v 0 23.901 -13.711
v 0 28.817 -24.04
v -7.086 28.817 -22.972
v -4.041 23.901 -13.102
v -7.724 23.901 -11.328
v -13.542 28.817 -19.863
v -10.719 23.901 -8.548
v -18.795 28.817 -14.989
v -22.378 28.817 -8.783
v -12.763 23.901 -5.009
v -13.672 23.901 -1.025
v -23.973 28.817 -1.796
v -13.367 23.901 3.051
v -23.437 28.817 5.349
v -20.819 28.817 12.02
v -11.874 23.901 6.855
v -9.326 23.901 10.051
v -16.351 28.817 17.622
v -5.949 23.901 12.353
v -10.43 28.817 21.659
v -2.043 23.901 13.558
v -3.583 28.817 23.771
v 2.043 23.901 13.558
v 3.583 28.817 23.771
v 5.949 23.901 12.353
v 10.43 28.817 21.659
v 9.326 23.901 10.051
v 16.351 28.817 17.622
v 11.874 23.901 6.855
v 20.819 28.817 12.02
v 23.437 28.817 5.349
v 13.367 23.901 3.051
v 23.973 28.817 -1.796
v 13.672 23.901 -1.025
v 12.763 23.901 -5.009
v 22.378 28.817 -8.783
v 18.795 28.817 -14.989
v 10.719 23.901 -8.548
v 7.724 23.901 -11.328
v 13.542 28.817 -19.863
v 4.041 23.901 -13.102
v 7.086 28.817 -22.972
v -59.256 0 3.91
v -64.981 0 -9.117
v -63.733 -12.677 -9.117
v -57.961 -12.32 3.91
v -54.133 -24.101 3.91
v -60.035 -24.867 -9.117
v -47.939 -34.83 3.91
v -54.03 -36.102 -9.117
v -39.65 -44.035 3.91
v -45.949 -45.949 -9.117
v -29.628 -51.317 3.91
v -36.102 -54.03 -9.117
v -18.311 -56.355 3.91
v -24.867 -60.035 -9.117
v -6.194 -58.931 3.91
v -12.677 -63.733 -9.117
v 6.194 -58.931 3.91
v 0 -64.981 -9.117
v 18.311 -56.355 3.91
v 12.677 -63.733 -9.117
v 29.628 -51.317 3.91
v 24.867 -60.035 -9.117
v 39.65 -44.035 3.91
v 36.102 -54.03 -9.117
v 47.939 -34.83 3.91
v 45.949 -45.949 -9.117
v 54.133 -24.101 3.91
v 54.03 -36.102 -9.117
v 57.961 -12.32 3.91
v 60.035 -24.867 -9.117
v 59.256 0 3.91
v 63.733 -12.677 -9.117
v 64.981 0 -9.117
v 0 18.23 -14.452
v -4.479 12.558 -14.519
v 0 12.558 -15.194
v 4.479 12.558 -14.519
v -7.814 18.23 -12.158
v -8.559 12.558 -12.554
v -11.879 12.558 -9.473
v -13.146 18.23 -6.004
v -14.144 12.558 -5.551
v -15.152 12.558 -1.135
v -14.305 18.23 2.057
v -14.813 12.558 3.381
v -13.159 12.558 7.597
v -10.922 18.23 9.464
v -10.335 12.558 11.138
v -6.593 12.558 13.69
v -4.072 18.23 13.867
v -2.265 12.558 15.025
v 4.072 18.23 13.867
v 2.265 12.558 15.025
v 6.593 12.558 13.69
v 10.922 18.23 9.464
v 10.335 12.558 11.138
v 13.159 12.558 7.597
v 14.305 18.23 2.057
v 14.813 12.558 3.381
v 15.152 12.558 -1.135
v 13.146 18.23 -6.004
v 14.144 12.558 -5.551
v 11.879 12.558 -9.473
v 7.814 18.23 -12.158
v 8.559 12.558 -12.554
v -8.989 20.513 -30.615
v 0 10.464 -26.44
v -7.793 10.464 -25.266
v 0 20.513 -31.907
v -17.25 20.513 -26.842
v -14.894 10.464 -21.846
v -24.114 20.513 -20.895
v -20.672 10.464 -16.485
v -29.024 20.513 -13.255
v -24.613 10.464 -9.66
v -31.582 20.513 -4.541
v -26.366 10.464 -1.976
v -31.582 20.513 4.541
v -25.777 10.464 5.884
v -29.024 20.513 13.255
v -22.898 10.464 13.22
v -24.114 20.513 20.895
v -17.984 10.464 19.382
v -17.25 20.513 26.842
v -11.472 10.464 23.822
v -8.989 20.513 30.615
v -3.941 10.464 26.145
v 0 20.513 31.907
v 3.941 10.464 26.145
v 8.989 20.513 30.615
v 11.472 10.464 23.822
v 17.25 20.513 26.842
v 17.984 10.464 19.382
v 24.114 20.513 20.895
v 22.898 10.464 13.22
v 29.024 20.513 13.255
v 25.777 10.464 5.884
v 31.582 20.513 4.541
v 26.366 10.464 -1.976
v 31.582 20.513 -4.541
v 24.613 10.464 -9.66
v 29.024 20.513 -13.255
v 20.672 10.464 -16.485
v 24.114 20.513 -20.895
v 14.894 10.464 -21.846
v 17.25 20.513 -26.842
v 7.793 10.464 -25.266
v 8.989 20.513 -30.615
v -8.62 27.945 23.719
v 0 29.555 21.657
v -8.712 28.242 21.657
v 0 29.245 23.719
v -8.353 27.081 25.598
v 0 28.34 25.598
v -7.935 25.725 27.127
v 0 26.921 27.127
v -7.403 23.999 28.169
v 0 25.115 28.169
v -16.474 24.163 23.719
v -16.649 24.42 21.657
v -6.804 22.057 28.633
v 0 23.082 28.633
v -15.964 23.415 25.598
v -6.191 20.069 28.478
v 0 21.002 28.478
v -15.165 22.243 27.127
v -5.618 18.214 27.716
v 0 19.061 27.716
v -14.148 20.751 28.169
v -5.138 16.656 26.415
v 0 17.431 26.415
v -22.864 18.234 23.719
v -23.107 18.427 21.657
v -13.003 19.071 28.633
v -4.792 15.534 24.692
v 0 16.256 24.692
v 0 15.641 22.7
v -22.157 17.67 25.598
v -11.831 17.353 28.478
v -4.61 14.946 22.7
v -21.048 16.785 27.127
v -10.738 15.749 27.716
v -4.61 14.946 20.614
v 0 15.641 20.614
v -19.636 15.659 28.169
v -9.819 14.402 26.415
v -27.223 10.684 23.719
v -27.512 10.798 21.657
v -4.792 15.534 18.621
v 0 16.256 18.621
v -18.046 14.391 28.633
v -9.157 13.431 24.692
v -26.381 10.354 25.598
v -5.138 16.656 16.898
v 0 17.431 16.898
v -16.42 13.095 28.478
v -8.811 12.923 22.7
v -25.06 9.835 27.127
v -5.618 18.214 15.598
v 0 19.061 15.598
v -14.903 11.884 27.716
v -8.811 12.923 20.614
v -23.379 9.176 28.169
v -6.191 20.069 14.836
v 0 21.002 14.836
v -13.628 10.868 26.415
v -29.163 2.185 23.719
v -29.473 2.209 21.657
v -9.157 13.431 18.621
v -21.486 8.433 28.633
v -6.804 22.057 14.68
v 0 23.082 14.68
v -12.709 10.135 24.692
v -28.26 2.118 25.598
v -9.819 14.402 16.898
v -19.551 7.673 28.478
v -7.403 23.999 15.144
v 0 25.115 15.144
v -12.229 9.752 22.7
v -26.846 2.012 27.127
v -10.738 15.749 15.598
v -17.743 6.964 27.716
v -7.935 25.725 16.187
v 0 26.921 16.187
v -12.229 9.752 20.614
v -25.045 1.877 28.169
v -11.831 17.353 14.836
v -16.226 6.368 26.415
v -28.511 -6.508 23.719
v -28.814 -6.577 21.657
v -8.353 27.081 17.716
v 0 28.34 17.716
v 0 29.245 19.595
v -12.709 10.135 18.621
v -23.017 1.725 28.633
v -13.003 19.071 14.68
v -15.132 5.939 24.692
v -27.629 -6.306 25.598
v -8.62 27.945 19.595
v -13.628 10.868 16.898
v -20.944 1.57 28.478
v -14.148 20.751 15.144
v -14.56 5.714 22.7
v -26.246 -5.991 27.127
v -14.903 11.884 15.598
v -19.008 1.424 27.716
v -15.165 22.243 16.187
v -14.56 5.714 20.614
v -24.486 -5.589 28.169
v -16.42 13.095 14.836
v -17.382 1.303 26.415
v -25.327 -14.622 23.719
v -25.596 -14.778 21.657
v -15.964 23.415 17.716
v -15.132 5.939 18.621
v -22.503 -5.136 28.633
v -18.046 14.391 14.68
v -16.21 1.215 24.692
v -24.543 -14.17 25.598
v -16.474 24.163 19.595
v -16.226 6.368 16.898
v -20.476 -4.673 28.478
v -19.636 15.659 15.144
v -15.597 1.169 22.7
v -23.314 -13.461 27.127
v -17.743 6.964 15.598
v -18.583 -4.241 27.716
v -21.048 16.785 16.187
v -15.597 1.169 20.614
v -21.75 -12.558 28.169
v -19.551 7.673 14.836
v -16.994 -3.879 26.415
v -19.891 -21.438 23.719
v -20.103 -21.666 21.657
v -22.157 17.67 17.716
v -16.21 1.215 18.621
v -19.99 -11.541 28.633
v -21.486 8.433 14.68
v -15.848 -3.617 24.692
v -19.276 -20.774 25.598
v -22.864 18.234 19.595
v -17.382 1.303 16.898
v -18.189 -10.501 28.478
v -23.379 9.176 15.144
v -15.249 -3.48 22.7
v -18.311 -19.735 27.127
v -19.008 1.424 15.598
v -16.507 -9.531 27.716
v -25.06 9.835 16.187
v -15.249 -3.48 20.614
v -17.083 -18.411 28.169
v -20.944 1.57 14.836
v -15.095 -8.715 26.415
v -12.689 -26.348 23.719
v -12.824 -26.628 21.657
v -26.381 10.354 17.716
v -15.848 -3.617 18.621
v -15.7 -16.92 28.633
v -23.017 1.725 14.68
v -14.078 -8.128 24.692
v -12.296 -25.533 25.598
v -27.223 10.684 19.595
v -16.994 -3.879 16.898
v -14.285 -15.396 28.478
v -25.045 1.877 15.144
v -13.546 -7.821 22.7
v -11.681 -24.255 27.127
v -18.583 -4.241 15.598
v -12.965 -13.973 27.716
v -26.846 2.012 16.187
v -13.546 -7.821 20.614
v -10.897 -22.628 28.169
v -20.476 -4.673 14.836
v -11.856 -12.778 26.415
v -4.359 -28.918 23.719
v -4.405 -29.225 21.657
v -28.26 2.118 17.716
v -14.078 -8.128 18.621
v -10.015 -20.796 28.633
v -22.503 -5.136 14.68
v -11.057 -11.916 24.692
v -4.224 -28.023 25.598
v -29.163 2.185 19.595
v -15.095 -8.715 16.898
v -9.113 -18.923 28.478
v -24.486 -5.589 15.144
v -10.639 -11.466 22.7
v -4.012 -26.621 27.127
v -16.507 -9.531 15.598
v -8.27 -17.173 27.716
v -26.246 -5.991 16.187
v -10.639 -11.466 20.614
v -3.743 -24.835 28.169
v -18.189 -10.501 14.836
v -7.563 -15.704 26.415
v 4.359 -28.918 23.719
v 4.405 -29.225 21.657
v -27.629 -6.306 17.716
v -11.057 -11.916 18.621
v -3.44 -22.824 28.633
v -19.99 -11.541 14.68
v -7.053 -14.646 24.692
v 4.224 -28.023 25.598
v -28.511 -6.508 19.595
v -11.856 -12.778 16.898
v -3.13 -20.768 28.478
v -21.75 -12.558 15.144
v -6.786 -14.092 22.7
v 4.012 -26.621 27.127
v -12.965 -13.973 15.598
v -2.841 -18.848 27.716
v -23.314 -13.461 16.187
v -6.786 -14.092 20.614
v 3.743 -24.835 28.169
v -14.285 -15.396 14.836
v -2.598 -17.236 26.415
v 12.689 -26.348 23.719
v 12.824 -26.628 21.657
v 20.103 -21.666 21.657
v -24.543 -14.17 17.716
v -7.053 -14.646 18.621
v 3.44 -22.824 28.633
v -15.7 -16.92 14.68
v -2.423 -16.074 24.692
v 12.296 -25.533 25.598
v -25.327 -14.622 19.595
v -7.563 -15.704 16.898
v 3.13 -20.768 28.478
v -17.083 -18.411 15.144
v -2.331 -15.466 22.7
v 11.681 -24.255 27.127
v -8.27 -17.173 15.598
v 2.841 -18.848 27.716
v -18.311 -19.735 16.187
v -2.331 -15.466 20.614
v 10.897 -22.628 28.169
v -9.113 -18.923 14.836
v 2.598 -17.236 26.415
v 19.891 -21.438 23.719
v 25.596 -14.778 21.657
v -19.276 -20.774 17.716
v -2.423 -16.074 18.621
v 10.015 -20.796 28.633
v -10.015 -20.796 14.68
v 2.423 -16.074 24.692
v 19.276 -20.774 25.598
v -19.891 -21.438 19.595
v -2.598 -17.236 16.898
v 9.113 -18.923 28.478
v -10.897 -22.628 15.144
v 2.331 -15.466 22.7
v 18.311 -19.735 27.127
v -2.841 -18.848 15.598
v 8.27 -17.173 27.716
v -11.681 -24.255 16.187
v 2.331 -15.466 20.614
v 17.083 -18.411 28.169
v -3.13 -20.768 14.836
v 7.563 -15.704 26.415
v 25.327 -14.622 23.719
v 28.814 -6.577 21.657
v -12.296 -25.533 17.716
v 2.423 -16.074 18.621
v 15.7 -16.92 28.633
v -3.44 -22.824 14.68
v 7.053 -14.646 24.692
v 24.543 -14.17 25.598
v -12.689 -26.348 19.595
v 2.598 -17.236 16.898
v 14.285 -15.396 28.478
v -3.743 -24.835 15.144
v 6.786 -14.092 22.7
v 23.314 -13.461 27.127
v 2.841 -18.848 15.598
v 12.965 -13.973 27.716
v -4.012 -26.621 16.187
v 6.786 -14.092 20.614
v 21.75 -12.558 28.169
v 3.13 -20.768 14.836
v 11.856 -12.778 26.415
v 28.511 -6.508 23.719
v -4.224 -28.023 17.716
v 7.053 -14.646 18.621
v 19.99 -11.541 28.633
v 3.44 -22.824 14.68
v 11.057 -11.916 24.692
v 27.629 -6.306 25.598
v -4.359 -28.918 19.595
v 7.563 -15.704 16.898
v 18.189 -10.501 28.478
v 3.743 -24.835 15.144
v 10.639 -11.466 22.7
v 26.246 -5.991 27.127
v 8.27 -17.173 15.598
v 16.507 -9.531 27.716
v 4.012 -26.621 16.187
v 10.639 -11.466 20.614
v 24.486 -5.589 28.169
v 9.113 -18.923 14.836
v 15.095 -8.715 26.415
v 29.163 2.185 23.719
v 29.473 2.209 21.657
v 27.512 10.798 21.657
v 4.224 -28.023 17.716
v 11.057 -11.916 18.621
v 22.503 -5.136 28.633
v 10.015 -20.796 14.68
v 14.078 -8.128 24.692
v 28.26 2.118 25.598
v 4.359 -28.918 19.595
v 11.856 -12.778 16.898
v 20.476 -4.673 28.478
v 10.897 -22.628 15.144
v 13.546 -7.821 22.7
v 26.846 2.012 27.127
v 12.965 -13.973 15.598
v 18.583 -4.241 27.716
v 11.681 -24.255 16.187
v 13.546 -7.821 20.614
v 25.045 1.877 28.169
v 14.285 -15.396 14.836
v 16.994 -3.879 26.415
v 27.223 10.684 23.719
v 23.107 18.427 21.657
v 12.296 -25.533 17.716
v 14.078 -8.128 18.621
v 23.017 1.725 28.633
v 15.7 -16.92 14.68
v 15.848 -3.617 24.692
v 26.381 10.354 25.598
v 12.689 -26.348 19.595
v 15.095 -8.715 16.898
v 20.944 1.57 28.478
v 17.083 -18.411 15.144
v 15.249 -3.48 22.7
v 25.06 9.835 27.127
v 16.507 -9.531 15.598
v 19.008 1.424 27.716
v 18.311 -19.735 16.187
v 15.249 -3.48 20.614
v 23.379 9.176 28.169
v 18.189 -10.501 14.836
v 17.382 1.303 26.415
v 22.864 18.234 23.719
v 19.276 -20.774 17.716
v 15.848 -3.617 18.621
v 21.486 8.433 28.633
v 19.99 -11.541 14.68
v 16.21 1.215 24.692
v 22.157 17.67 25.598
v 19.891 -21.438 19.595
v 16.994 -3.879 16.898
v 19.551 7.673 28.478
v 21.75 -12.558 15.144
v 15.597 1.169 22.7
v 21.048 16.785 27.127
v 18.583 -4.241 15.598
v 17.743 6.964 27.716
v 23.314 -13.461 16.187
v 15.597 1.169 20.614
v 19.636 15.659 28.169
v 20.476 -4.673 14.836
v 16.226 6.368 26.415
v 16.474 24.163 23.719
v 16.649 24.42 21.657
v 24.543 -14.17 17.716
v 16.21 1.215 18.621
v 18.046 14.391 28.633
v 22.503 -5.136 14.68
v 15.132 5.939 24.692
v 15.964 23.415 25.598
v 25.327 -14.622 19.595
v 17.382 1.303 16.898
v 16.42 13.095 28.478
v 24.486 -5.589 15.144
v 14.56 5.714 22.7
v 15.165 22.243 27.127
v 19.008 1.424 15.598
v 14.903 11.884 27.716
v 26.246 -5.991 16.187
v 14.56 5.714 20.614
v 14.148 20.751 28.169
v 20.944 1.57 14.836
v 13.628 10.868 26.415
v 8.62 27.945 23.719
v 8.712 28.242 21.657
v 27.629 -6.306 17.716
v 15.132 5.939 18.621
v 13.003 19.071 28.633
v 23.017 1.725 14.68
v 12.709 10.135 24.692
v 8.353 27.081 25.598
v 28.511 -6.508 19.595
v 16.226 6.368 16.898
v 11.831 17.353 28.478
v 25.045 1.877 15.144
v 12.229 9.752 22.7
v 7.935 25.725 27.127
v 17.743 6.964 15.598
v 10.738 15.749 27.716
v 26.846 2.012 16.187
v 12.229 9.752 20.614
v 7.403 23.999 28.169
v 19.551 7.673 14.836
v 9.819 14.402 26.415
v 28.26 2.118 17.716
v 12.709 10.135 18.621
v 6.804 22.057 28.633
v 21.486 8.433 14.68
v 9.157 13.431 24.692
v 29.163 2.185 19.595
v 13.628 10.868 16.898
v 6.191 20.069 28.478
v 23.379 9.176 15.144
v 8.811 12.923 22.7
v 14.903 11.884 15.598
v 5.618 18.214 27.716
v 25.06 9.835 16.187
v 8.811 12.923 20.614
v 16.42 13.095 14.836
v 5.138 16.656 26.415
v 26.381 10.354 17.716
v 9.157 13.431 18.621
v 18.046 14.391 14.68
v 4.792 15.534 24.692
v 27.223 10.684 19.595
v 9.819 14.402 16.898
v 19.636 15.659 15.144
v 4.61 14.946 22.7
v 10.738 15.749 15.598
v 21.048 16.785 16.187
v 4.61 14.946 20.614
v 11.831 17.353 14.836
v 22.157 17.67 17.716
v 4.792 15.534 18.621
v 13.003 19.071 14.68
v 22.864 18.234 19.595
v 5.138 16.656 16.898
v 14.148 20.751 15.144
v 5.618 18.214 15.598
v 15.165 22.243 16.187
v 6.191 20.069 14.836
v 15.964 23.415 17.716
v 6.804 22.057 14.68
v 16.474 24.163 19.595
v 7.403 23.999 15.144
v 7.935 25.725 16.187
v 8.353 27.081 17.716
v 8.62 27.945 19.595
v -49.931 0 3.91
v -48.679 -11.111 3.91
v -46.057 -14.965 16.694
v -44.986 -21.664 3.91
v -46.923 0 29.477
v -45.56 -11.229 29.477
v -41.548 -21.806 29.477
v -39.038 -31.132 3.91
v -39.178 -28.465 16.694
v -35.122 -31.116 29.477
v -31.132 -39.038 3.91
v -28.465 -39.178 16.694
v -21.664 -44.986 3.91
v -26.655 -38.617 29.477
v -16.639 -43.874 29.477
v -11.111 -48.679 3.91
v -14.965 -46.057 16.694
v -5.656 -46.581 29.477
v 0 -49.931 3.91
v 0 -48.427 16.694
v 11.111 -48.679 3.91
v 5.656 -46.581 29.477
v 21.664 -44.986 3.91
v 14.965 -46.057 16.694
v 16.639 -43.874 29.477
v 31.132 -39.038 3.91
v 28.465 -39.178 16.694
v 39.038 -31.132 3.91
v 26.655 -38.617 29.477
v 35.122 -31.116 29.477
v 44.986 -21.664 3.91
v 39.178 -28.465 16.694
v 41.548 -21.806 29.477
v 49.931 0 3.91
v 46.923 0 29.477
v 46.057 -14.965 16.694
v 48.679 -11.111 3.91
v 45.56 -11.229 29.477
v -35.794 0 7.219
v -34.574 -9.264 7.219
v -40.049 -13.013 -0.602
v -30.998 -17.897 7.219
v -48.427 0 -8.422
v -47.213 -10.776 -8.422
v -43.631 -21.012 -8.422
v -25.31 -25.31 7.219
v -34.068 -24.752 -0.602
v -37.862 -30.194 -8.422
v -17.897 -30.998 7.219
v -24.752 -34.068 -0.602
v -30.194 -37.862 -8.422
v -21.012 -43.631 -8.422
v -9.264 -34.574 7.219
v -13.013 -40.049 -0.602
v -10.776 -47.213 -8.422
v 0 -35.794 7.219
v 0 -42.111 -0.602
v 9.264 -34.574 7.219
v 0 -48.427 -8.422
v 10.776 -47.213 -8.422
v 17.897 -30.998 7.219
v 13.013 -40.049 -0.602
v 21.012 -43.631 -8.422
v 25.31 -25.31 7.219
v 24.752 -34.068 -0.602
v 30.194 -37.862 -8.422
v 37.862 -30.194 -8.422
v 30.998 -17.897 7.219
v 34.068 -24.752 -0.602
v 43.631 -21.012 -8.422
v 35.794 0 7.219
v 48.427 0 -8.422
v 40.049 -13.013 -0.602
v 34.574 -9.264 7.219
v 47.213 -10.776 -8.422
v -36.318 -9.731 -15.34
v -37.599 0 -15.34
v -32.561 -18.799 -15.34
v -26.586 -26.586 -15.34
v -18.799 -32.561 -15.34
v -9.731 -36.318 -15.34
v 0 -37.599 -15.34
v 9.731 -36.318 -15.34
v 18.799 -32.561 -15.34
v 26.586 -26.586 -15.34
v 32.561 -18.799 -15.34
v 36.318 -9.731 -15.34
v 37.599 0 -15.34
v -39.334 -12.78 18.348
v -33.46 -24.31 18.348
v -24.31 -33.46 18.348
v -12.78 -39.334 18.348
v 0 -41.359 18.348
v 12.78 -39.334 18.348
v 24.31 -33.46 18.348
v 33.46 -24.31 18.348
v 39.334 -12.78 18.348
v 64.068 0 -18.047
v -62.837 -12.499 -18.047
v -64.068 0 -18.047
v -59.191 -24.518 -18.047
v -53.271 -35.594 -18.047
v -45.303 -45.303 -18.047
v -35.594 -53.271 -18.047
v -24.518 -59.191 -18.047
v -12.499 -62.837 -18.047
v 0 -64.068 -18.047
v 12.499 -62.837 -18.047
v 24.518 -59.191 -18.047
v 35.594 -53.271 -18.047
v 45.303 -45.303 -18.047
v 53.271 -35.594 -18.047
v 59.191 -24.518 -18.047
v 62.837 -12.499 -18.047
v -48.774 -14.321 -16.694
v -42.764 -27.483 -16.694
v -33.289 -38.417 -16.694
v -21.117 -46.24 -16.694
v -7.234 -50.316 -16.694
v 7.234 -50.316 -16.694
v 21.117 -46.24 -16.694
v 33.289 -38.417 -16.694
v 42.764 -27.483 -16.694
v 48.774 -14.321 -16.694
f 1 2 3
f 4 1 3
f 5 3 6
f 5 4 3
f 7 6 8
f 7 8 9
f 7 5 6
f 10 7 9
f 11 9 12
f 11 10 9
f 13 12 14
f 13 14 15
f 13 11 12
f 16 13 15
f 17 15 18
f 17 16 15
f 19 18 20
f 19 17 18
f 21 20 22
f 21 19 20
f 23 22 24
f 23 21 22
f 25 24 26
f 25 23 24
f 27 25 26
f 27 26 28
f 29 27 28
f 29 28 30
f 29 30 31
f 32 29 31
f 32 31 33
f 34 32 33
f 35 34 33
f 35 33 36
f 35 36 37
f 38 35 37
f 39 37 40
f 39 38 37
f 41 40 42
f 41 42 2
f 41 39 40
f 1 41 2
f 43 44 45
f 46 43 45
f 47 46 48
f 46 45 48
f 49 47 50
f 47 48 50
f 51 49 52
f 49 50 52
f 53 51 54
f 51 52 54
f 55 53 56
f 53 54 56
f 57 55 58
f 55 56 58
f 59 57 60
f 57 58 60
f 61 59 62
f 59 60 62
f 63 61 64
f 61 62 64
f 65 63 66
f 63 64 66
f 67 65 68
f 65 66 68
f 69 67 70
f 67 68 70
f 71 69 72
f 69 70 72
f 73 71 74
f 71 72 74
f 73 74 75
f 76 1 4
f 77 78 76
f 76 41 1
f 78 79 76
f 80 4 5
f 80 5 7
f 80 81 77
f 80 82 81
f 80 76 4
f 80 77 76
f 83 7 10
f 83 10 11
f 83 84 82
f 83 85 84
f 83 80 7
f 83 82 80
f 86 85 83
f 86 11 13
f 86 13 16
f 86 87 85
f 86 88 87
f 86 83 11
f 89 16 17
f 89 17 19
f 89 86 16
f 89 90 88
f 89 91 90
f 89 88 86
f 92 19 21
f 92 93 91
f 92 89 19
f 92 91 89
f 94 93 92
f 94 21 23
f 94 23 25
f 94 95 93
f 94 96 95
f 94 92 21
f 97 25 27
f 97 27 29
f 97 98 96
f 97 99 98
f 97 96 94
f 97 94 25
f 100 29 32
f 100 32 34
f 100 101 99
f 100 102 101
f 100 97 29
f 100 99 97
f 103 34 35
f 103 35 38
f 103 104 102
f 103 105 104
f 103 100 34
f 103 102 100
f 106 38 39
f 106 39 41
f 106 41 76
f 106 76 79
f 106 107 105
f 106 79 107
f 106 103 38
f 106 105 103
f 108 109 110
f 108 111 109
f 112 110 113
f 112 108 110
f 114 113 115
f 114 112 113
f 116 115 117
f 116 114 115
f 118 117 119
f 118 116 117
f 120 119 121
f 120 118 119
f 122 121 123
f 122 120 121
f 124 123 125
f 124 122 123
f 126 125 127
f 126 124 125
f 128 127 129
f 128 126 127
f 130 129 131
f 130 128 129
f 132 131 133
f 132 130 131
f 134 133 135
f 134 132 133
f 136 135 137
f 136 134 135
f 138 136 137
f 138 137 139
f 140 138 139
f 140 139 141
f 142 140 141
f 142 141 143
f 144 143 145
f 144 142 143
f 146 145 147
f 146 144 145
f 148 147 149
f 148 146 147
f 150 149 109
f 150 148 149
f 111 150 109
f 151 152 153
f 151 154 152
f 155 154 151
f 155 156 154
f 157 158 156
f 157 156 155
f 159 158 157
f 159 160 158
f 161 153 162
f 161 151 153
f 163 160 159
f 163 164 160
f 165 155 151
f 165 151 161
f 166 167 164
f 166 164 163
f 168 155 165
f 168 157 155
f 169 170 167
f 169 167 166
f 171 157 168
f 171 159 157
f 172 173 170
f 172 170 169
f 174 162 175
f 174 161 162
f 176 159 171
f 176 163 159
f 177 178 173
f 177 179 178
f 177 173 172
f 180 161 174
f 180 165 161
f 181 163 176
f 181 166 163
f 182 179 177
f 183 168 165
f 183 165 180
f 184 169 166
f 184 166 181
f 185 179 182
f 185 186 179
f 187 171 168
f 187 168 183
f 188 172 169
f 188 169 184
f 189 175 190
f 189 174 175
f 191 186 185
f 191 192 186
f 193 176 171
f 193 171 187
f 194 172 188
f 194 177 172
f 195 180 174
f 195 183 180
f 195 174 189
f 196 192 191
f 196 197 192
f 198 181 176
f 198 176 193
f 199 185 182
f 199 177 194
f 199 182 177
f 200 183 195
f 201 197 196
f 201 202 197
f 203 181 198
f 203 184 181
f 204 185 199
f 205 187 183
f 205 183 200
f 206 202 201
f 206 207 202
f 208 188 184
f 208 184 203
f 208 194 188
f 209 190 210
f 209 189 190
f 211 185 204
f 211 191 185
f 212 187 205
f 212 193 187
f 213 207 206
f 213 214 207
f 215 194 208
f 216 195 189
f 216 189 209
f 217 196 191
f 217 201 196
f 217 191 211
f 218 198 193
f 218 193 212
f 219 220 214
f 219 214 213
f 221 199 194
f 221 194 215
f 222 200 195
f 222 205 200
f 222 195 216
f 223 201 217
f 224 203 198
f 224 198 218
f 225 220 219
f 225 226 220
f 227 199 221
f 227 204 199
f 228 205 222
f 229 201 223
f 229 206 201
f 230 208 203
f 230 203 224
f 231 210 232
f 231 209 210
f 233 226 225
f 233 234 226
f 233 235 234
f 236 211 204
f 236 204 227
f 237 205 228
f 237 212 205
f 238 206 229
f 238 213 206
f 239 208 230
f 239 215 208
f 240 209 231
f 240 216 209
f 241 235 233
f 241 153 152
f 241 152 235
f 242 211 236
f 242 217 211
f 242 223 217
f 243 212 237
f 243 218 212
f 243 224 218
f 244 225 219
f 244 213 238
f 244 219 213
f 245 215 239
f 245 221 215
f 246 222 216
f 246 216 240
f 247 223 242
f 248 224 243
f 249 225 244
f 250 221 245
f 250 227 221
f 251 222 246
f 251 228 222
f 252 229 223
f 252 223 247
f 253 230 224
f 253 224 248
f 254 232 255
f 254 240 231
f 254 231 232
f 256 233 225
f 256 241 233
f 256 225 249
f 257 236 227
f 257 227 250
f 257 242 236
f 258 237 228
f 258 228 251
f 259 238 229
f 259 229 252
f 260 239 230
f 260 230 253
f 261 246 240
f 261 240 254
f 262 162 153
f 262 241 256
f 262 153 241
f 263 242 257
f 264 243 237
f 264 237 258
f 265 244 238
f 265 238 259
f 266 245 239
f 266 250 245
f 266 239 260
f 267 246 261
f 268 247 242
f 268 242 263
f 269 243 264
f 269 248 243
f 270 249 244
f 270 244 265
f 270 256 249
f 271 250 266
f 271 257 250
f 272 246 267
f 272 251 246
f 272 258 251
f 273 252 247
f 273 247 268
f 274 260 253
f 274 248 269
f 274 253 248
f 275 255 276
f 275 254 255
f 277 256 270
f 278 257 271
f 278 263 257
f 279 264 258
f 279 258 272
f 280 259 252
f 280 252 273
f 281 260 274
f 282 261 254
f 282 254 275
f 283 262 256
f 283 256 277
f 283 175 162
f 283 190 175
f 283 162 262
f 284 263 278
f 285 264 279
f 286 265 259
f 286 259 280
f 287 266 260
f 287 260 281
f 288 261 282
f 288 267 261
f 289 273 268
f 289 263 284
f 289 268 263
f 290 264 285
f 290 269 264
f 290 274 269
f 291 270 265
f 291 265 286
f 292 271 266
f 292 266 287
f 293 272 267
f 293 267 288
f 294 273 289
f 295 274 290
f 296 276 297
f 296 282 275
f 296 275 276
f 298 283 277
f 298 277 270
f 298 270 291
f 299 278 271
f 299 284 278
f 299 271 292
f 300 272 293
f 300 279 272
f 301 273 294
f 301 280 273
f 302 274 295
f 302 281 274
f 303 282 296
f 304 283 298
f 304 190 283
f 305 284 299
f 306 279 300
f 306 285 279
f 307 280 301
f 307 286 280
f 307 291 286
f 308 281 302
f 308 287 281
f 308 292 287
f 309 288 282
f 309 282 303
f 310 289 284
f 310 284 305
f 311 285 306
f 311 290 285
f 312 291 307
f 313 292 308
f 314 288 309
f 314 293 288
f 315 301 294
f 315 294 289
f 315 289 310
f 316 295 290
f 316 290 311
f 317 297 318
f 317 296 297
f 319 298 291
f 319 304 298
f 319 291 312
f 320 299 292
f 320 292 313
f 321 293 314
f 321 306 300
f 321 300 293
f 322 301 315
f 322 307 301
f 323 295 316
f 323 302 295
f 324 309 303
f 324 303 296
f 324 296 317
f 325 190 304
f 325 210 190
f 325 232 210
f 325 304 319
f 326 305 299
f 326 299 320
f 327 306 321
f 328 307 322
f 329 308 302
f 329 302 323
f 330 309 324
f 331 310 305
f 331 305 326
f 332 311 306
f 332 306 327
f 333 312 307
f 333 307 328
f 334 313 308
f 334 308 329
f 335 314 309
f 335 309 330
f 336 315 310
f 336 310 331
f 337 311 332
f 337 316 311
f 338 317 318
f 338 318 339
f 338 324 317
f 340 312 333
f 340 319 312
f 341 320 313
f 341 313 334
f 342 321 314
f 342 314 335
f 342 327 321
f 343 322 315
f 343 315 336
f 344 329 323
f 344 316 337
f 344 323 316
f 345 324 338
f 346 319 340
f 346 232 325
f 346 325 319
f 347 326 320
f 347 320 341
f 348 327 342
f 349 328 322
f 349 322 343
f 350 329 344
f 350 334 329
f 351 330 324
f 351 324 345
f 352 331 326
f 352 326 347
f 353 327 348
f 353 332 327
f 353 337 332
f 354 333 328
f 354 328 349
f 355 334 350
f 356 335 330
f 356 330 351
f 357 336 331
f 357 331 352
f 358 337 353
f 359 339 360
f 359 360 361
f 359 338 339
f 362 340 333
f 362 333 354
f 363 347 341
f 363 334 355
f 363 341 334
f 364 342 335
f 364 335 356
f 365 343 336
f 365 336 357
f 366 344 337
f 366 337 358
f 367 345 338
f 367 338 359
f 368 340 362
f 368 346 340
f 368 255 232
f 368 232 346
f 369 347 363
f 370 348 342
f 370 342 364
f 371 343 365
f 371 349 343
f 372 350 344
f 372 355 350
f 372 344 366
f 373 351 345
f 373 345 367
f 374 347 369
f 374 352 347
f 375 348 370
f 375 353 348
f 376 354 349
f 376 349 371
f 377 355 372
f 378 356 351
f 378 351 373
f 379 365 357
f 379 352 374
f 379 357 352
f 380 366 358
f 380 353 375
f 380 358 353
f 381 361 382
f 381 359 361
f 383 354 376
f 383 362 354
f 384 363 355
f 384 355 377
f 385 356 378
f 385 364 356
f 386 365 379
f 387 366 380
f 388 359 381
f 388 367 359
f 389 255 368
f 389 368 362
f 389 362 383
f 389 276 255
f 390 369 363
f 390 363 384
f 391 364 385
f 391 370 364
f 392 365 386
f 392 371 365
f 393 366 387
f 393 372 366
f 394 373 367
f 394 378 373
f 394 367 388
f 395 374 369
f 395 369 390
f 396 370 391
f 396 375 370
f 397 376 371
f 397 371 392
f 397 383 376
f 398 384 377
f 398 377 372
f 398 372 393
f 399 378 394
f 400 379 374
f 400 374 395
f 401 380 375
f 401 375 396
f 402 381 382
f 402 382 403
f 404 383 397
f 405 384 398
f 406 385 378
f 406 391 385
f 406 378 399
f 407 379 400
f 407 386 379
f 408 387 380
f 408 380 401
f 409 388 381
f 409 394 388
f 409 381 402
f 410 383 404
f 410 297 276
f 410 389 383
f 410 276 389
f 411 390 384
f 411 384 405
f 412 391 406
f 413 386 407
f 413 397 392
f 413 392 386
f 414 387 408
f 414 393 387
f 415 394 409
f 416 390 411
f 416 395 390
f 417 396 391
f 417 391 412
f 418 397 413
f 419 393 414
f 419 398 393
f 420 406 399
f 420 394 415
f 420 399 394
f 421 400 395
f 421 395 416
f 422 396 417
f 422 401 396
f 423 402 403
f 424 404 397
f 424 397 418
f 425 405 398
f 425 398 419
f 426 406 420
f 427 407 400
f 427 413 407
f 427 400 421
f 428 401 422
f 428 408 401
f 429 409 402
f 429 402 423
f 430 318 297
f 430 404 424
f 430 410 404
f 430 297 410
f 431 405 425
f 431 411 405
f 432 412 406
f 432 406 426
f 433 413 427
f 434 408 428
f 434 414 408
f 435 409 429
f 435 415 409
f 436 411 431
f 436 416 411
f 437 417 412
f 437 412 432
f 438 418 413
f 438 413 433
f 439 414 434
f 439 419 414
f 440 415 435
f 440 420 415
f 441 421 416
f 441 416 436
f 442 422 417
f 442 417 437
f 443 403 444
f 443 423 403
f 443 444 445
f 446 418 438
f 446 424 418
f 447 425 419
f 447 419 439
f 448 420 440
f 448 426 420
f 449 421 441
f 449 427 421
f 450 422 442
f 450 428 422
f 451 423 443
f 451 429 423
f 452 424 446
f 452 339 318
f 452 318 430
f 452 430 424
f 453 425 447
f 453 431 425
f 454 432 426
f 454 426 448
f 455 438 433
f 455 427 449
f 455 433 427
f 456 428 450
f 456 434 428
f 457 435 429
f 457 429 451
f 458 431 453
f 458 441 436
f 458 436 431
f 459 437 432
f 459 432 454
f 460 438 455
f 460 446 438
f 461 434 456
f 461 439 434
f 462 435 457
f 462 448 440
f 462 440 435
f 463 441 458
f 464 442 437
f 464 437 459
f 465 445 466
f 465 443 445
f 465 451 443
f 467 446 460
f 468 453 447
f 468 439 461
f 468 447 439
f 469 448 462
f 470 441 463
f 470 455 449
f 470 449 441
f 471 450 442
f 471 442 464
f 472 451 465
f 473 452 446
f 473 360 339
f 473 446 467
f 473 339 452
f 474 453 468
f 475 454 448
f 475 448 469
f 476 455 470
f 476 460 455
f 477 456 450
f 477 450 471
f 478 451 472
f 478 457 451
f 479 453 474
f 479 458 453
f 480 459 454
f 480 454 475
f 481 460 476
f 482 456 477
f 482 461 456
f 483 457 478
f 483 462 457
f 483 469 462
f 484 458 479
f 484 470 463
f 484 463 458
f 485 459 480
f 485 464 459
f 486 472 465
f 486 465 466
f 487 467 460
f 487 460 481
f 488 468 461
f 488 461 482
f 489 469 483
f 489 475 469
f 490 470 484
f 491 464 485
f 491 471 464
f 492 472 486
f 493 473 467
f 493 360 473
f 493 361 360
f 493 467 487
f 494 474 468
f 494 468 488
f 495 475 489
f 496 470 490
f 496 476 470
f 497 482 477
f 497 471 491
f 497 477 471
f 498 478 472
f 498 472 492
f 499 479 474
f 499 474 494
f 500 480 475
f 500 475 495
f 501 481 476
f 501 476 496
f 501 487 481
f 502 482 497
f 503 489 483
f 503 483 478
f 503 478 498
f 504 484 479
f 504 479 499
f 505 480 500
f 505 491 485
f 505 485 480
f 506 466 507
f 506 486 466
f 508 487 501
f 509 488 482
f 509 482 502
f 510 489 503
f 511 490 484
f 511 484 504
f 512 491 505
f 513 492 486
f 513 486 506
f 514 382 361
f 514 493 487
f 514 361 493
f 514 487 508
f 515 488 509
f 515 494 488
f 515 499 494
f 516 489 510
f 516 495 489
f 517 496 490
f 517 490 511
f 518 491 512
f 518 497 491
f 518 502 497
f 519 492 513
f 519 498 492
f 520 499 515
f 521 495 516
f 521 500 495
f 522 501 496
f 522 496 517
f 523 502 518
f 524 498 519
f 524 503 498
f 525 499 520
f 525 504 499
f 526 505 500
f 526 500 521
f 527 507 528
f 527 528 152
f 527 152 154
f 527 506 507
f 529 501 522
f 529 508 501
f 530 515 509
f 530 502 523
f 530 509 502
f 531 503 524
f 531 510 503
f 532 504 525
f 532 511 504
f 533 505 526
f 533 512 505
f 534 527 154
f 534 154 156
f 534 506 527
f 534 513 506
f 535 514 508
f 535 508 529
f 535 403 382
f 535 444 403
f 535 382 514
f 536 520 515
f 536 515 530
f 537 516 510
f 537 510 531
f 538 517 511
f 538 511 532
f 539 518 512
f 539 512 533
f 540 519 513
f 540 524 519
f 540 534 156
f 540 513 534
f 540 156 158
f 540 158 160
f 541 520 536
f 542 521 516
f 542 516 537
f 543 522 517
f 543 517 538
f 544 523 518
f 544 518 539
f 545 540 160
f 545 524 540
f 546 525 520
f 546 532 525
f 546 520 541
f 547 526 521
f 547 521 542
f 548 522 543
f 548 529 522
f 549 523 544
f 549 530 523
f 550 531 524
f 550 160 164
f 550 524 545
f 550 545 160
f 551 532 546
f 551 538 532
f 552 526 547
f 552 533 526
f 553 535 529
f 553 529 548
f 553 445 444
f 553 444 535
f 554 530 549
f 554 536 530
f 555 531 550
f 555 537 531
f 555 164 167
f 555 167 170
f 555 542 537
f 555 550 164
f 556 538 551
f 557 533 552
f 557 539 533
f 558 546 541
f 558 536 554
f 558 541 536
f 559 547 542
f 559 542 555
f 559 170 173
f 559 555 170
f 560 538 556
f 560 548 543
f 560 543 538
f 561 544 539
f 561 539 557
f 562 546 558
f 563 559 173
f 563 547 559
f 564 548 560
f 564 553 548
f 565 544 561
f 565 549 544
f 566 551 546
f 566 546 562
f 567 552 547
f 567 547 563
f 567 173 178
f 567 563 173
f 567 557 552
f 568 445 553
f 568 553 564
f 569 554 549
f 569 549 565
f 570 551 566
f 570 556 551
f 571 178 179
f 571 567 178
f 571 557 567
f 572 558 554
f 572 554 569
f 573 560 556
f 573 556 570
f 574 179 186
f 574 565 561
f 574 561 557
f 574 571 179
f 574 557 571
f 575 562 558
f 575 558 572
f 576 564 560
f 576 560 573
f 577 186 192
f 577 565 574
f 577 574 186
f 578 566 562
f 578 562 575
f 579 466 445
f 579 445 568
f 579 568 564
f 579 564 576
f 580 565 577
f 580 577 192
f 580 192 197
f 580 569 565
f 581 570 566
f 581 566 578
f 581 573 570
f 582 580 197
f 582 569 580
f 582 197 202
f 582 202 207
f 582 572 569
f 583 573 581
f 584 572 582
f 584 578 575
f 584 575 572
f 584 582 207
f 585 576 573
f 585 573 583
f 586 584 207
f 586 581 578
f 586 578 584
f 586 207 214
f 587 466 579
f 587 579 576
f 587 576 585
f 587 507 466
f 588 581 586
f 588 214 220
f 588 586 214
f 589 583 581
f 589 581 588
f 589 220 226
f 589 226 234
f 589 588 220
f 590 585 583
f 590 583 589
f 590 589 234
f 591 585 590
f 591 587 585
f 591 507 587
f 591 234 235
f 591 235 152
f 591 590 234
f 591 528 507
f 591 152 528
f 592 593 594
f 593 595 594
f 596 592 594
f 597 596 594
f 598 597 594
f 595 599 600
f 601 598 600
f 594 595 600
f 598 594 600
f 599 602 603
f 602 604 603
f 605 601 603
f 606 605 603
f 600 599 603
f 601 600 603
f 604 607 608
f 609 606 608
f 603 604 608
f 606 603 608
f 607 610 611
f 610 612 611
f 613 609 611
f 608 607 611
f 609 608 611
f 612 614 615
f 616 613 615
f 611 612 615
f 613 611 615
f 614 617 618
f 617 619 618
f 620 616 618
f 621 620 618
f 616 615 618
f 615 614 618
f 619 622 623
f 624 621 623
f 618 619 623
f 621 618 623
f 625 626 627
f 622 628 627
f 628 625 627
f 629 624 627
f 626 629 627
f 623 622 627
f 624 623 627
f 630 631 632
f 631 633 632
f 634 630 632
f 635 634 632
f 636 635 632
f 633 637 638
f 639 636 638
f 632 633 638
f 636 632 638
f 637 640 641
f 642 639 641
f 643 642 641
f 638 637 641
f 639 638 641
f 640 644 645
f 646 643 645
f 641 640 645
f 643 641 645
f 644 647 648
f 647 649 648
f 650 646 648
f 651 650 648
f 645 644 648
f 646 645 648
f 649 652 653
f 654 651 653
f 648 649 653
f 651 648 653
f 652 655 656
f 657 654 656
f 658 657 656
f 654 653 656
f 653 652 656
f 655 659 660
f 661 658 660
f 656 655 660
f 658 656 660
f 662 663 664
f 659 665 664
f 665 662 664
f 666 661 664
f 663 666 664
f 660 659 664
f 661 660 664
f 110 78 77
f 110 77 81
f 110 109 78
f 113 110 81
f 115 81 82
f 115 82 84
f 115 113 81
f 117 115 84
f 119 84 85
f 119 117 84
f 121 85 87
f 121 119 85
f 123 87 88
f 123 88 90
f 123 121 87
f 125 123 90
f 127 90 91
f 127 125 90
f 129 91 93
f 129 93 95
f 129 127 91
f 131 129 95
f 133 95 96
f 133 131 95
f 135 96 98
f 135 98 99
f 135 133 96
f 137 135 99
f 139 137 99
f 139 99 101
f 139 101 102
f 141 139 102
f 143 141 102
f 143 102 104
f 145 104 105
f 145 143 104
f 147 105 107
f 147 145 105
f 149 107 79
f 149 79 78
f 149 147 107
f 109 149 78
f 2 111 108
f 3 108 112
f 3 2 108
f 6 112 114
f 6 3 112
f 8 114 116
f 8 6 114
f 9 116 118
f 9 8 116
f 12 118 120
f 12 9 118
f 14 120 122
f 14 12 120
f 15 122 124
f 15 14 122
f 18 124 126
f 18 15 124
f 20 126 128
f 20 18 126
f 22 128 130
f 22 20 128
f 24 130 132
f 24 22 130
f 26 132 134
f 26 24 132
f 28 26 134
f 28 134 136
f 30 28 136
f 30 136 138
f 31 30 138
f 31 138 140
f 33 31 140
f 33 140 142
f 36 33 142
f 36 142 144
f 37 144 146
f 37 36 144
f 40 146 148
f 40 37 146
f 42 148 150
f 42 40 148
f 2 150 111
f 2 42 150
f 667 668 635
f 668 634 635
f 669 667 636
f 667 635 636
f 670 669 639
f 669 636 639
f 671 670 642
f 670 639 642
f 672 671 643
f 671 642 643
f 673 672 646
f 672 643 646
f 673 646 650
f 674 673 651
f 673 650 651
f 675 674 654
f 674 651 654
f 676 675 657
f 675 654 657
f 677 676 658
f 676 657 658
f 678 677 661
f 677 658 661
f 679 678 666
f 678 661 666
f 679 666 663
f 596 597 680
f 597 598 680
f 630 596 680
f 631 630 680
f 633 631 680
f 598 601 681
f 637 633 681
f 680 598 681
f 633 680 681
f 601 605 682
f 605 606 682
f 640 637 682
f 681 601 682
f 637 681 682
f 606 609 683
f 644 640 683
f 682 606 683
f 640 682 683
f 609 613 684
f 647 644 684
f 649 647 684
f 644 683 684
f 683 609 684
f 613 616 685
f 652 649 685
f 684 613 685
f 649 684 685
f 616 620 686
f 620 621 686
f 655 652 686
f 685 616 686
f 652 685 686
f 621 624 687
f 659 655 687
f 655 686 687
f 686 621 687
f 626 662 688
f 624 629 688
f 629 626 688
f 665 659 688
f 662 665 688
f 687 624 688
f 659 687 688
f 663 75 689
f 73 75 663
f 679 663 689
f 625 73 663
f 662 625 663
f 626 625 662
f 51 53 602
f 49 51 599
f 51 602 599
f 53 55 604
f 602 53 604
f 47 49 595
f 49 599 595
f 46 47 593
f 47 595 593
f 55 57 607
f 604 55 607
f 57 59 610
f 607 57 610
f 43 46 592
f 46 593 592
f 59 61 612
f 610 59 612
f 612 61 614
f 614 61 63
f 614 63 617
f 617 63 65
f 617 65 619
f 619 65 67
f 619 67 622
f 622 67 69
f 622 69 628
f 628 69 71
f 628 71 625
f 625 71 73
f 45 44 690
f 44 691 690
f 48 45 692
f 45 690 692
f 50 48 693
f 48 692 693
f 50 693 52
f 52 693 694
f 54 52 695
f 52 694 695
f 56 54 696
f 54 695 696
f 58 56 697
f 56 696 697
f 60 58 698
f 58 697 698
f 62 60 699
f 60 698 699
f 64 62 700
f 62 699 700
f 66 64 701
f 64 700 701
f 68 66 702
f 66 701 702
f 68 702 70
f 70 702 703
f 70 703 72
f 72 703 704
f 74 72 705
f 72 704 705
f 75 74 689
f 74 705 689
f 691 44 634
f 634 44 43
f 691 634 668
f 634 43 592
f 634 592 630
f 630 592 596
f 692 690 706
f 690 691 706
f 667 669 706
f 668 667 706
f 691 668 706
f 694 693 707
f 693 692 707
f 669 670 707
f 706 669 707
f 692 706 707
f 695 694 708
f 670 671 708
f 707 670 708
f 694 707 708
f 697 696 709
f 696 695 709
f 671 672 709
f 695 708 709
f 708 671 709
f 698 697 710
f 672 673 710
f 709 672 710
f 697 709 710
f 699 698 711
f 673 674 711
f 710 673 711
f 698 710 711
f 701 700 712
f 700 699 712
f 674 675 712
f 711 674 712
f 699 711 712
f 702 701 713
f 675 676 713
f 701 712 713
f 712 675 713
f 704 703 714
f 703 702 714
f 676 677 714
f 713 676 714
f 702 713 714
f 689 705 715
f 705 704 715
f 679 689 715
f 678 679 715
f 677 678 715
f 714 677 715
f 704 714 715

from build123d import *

# Parameters (mm, degrees)
F0_R     = 6.996185
F5_ANGLE = 180


with BuildPart() as f1:
    # F0 (on Right) → F1 (revolve)
    with BuildSketch(Plane.YZ):
        with Locations((22.559211, 21.656843)):
            Circle(F0_R)
    revolve(axis=Axis((0, 0, 18.949738), (0, 0, 1)))


with BuildPart() as f3:
    # F2 (on Right) → F3 (revolve)
    with BuildSketch(Plane.YZ):
        Polygon((20.512544, -31.907075), (28.816927, -24.03977), (23.90087, -13.710701), (12.558197, -15.194291), (10.464096, -26.440269), align=None)
    revolve(axis=Axis((0, 18.949738, 0), (0, 1, 0)))


with BuildPart() as f5:
    # F4 (on Right) → F5 (revolve, symmetric)
    with BuildSketch(Plane.YZ) as f5_sk:
        Polygon((-37.598684, -15.340263), (-48.427105, -8.422106), (-35.793949, 7.218947), (-46.923161, 29.477369), (-49.931053, 3.910263), (-59.255525, 3.910263), (-64.981484, -9.117092), (-64.068161, -18.047368), align=None)
    revolve(axis=Axis((0, 0, -6.688364), (0, 0, -1)), revolution_arc=F5_ANGLE / 2)
    revolve(f5_sk.sketch, axis=Axis((0, 0, -6.688364), (0, 0, 1)), revolution_arc=F5_ANGLE / 2)


solid = Compound([f1.part, f3.part, f5.part])
